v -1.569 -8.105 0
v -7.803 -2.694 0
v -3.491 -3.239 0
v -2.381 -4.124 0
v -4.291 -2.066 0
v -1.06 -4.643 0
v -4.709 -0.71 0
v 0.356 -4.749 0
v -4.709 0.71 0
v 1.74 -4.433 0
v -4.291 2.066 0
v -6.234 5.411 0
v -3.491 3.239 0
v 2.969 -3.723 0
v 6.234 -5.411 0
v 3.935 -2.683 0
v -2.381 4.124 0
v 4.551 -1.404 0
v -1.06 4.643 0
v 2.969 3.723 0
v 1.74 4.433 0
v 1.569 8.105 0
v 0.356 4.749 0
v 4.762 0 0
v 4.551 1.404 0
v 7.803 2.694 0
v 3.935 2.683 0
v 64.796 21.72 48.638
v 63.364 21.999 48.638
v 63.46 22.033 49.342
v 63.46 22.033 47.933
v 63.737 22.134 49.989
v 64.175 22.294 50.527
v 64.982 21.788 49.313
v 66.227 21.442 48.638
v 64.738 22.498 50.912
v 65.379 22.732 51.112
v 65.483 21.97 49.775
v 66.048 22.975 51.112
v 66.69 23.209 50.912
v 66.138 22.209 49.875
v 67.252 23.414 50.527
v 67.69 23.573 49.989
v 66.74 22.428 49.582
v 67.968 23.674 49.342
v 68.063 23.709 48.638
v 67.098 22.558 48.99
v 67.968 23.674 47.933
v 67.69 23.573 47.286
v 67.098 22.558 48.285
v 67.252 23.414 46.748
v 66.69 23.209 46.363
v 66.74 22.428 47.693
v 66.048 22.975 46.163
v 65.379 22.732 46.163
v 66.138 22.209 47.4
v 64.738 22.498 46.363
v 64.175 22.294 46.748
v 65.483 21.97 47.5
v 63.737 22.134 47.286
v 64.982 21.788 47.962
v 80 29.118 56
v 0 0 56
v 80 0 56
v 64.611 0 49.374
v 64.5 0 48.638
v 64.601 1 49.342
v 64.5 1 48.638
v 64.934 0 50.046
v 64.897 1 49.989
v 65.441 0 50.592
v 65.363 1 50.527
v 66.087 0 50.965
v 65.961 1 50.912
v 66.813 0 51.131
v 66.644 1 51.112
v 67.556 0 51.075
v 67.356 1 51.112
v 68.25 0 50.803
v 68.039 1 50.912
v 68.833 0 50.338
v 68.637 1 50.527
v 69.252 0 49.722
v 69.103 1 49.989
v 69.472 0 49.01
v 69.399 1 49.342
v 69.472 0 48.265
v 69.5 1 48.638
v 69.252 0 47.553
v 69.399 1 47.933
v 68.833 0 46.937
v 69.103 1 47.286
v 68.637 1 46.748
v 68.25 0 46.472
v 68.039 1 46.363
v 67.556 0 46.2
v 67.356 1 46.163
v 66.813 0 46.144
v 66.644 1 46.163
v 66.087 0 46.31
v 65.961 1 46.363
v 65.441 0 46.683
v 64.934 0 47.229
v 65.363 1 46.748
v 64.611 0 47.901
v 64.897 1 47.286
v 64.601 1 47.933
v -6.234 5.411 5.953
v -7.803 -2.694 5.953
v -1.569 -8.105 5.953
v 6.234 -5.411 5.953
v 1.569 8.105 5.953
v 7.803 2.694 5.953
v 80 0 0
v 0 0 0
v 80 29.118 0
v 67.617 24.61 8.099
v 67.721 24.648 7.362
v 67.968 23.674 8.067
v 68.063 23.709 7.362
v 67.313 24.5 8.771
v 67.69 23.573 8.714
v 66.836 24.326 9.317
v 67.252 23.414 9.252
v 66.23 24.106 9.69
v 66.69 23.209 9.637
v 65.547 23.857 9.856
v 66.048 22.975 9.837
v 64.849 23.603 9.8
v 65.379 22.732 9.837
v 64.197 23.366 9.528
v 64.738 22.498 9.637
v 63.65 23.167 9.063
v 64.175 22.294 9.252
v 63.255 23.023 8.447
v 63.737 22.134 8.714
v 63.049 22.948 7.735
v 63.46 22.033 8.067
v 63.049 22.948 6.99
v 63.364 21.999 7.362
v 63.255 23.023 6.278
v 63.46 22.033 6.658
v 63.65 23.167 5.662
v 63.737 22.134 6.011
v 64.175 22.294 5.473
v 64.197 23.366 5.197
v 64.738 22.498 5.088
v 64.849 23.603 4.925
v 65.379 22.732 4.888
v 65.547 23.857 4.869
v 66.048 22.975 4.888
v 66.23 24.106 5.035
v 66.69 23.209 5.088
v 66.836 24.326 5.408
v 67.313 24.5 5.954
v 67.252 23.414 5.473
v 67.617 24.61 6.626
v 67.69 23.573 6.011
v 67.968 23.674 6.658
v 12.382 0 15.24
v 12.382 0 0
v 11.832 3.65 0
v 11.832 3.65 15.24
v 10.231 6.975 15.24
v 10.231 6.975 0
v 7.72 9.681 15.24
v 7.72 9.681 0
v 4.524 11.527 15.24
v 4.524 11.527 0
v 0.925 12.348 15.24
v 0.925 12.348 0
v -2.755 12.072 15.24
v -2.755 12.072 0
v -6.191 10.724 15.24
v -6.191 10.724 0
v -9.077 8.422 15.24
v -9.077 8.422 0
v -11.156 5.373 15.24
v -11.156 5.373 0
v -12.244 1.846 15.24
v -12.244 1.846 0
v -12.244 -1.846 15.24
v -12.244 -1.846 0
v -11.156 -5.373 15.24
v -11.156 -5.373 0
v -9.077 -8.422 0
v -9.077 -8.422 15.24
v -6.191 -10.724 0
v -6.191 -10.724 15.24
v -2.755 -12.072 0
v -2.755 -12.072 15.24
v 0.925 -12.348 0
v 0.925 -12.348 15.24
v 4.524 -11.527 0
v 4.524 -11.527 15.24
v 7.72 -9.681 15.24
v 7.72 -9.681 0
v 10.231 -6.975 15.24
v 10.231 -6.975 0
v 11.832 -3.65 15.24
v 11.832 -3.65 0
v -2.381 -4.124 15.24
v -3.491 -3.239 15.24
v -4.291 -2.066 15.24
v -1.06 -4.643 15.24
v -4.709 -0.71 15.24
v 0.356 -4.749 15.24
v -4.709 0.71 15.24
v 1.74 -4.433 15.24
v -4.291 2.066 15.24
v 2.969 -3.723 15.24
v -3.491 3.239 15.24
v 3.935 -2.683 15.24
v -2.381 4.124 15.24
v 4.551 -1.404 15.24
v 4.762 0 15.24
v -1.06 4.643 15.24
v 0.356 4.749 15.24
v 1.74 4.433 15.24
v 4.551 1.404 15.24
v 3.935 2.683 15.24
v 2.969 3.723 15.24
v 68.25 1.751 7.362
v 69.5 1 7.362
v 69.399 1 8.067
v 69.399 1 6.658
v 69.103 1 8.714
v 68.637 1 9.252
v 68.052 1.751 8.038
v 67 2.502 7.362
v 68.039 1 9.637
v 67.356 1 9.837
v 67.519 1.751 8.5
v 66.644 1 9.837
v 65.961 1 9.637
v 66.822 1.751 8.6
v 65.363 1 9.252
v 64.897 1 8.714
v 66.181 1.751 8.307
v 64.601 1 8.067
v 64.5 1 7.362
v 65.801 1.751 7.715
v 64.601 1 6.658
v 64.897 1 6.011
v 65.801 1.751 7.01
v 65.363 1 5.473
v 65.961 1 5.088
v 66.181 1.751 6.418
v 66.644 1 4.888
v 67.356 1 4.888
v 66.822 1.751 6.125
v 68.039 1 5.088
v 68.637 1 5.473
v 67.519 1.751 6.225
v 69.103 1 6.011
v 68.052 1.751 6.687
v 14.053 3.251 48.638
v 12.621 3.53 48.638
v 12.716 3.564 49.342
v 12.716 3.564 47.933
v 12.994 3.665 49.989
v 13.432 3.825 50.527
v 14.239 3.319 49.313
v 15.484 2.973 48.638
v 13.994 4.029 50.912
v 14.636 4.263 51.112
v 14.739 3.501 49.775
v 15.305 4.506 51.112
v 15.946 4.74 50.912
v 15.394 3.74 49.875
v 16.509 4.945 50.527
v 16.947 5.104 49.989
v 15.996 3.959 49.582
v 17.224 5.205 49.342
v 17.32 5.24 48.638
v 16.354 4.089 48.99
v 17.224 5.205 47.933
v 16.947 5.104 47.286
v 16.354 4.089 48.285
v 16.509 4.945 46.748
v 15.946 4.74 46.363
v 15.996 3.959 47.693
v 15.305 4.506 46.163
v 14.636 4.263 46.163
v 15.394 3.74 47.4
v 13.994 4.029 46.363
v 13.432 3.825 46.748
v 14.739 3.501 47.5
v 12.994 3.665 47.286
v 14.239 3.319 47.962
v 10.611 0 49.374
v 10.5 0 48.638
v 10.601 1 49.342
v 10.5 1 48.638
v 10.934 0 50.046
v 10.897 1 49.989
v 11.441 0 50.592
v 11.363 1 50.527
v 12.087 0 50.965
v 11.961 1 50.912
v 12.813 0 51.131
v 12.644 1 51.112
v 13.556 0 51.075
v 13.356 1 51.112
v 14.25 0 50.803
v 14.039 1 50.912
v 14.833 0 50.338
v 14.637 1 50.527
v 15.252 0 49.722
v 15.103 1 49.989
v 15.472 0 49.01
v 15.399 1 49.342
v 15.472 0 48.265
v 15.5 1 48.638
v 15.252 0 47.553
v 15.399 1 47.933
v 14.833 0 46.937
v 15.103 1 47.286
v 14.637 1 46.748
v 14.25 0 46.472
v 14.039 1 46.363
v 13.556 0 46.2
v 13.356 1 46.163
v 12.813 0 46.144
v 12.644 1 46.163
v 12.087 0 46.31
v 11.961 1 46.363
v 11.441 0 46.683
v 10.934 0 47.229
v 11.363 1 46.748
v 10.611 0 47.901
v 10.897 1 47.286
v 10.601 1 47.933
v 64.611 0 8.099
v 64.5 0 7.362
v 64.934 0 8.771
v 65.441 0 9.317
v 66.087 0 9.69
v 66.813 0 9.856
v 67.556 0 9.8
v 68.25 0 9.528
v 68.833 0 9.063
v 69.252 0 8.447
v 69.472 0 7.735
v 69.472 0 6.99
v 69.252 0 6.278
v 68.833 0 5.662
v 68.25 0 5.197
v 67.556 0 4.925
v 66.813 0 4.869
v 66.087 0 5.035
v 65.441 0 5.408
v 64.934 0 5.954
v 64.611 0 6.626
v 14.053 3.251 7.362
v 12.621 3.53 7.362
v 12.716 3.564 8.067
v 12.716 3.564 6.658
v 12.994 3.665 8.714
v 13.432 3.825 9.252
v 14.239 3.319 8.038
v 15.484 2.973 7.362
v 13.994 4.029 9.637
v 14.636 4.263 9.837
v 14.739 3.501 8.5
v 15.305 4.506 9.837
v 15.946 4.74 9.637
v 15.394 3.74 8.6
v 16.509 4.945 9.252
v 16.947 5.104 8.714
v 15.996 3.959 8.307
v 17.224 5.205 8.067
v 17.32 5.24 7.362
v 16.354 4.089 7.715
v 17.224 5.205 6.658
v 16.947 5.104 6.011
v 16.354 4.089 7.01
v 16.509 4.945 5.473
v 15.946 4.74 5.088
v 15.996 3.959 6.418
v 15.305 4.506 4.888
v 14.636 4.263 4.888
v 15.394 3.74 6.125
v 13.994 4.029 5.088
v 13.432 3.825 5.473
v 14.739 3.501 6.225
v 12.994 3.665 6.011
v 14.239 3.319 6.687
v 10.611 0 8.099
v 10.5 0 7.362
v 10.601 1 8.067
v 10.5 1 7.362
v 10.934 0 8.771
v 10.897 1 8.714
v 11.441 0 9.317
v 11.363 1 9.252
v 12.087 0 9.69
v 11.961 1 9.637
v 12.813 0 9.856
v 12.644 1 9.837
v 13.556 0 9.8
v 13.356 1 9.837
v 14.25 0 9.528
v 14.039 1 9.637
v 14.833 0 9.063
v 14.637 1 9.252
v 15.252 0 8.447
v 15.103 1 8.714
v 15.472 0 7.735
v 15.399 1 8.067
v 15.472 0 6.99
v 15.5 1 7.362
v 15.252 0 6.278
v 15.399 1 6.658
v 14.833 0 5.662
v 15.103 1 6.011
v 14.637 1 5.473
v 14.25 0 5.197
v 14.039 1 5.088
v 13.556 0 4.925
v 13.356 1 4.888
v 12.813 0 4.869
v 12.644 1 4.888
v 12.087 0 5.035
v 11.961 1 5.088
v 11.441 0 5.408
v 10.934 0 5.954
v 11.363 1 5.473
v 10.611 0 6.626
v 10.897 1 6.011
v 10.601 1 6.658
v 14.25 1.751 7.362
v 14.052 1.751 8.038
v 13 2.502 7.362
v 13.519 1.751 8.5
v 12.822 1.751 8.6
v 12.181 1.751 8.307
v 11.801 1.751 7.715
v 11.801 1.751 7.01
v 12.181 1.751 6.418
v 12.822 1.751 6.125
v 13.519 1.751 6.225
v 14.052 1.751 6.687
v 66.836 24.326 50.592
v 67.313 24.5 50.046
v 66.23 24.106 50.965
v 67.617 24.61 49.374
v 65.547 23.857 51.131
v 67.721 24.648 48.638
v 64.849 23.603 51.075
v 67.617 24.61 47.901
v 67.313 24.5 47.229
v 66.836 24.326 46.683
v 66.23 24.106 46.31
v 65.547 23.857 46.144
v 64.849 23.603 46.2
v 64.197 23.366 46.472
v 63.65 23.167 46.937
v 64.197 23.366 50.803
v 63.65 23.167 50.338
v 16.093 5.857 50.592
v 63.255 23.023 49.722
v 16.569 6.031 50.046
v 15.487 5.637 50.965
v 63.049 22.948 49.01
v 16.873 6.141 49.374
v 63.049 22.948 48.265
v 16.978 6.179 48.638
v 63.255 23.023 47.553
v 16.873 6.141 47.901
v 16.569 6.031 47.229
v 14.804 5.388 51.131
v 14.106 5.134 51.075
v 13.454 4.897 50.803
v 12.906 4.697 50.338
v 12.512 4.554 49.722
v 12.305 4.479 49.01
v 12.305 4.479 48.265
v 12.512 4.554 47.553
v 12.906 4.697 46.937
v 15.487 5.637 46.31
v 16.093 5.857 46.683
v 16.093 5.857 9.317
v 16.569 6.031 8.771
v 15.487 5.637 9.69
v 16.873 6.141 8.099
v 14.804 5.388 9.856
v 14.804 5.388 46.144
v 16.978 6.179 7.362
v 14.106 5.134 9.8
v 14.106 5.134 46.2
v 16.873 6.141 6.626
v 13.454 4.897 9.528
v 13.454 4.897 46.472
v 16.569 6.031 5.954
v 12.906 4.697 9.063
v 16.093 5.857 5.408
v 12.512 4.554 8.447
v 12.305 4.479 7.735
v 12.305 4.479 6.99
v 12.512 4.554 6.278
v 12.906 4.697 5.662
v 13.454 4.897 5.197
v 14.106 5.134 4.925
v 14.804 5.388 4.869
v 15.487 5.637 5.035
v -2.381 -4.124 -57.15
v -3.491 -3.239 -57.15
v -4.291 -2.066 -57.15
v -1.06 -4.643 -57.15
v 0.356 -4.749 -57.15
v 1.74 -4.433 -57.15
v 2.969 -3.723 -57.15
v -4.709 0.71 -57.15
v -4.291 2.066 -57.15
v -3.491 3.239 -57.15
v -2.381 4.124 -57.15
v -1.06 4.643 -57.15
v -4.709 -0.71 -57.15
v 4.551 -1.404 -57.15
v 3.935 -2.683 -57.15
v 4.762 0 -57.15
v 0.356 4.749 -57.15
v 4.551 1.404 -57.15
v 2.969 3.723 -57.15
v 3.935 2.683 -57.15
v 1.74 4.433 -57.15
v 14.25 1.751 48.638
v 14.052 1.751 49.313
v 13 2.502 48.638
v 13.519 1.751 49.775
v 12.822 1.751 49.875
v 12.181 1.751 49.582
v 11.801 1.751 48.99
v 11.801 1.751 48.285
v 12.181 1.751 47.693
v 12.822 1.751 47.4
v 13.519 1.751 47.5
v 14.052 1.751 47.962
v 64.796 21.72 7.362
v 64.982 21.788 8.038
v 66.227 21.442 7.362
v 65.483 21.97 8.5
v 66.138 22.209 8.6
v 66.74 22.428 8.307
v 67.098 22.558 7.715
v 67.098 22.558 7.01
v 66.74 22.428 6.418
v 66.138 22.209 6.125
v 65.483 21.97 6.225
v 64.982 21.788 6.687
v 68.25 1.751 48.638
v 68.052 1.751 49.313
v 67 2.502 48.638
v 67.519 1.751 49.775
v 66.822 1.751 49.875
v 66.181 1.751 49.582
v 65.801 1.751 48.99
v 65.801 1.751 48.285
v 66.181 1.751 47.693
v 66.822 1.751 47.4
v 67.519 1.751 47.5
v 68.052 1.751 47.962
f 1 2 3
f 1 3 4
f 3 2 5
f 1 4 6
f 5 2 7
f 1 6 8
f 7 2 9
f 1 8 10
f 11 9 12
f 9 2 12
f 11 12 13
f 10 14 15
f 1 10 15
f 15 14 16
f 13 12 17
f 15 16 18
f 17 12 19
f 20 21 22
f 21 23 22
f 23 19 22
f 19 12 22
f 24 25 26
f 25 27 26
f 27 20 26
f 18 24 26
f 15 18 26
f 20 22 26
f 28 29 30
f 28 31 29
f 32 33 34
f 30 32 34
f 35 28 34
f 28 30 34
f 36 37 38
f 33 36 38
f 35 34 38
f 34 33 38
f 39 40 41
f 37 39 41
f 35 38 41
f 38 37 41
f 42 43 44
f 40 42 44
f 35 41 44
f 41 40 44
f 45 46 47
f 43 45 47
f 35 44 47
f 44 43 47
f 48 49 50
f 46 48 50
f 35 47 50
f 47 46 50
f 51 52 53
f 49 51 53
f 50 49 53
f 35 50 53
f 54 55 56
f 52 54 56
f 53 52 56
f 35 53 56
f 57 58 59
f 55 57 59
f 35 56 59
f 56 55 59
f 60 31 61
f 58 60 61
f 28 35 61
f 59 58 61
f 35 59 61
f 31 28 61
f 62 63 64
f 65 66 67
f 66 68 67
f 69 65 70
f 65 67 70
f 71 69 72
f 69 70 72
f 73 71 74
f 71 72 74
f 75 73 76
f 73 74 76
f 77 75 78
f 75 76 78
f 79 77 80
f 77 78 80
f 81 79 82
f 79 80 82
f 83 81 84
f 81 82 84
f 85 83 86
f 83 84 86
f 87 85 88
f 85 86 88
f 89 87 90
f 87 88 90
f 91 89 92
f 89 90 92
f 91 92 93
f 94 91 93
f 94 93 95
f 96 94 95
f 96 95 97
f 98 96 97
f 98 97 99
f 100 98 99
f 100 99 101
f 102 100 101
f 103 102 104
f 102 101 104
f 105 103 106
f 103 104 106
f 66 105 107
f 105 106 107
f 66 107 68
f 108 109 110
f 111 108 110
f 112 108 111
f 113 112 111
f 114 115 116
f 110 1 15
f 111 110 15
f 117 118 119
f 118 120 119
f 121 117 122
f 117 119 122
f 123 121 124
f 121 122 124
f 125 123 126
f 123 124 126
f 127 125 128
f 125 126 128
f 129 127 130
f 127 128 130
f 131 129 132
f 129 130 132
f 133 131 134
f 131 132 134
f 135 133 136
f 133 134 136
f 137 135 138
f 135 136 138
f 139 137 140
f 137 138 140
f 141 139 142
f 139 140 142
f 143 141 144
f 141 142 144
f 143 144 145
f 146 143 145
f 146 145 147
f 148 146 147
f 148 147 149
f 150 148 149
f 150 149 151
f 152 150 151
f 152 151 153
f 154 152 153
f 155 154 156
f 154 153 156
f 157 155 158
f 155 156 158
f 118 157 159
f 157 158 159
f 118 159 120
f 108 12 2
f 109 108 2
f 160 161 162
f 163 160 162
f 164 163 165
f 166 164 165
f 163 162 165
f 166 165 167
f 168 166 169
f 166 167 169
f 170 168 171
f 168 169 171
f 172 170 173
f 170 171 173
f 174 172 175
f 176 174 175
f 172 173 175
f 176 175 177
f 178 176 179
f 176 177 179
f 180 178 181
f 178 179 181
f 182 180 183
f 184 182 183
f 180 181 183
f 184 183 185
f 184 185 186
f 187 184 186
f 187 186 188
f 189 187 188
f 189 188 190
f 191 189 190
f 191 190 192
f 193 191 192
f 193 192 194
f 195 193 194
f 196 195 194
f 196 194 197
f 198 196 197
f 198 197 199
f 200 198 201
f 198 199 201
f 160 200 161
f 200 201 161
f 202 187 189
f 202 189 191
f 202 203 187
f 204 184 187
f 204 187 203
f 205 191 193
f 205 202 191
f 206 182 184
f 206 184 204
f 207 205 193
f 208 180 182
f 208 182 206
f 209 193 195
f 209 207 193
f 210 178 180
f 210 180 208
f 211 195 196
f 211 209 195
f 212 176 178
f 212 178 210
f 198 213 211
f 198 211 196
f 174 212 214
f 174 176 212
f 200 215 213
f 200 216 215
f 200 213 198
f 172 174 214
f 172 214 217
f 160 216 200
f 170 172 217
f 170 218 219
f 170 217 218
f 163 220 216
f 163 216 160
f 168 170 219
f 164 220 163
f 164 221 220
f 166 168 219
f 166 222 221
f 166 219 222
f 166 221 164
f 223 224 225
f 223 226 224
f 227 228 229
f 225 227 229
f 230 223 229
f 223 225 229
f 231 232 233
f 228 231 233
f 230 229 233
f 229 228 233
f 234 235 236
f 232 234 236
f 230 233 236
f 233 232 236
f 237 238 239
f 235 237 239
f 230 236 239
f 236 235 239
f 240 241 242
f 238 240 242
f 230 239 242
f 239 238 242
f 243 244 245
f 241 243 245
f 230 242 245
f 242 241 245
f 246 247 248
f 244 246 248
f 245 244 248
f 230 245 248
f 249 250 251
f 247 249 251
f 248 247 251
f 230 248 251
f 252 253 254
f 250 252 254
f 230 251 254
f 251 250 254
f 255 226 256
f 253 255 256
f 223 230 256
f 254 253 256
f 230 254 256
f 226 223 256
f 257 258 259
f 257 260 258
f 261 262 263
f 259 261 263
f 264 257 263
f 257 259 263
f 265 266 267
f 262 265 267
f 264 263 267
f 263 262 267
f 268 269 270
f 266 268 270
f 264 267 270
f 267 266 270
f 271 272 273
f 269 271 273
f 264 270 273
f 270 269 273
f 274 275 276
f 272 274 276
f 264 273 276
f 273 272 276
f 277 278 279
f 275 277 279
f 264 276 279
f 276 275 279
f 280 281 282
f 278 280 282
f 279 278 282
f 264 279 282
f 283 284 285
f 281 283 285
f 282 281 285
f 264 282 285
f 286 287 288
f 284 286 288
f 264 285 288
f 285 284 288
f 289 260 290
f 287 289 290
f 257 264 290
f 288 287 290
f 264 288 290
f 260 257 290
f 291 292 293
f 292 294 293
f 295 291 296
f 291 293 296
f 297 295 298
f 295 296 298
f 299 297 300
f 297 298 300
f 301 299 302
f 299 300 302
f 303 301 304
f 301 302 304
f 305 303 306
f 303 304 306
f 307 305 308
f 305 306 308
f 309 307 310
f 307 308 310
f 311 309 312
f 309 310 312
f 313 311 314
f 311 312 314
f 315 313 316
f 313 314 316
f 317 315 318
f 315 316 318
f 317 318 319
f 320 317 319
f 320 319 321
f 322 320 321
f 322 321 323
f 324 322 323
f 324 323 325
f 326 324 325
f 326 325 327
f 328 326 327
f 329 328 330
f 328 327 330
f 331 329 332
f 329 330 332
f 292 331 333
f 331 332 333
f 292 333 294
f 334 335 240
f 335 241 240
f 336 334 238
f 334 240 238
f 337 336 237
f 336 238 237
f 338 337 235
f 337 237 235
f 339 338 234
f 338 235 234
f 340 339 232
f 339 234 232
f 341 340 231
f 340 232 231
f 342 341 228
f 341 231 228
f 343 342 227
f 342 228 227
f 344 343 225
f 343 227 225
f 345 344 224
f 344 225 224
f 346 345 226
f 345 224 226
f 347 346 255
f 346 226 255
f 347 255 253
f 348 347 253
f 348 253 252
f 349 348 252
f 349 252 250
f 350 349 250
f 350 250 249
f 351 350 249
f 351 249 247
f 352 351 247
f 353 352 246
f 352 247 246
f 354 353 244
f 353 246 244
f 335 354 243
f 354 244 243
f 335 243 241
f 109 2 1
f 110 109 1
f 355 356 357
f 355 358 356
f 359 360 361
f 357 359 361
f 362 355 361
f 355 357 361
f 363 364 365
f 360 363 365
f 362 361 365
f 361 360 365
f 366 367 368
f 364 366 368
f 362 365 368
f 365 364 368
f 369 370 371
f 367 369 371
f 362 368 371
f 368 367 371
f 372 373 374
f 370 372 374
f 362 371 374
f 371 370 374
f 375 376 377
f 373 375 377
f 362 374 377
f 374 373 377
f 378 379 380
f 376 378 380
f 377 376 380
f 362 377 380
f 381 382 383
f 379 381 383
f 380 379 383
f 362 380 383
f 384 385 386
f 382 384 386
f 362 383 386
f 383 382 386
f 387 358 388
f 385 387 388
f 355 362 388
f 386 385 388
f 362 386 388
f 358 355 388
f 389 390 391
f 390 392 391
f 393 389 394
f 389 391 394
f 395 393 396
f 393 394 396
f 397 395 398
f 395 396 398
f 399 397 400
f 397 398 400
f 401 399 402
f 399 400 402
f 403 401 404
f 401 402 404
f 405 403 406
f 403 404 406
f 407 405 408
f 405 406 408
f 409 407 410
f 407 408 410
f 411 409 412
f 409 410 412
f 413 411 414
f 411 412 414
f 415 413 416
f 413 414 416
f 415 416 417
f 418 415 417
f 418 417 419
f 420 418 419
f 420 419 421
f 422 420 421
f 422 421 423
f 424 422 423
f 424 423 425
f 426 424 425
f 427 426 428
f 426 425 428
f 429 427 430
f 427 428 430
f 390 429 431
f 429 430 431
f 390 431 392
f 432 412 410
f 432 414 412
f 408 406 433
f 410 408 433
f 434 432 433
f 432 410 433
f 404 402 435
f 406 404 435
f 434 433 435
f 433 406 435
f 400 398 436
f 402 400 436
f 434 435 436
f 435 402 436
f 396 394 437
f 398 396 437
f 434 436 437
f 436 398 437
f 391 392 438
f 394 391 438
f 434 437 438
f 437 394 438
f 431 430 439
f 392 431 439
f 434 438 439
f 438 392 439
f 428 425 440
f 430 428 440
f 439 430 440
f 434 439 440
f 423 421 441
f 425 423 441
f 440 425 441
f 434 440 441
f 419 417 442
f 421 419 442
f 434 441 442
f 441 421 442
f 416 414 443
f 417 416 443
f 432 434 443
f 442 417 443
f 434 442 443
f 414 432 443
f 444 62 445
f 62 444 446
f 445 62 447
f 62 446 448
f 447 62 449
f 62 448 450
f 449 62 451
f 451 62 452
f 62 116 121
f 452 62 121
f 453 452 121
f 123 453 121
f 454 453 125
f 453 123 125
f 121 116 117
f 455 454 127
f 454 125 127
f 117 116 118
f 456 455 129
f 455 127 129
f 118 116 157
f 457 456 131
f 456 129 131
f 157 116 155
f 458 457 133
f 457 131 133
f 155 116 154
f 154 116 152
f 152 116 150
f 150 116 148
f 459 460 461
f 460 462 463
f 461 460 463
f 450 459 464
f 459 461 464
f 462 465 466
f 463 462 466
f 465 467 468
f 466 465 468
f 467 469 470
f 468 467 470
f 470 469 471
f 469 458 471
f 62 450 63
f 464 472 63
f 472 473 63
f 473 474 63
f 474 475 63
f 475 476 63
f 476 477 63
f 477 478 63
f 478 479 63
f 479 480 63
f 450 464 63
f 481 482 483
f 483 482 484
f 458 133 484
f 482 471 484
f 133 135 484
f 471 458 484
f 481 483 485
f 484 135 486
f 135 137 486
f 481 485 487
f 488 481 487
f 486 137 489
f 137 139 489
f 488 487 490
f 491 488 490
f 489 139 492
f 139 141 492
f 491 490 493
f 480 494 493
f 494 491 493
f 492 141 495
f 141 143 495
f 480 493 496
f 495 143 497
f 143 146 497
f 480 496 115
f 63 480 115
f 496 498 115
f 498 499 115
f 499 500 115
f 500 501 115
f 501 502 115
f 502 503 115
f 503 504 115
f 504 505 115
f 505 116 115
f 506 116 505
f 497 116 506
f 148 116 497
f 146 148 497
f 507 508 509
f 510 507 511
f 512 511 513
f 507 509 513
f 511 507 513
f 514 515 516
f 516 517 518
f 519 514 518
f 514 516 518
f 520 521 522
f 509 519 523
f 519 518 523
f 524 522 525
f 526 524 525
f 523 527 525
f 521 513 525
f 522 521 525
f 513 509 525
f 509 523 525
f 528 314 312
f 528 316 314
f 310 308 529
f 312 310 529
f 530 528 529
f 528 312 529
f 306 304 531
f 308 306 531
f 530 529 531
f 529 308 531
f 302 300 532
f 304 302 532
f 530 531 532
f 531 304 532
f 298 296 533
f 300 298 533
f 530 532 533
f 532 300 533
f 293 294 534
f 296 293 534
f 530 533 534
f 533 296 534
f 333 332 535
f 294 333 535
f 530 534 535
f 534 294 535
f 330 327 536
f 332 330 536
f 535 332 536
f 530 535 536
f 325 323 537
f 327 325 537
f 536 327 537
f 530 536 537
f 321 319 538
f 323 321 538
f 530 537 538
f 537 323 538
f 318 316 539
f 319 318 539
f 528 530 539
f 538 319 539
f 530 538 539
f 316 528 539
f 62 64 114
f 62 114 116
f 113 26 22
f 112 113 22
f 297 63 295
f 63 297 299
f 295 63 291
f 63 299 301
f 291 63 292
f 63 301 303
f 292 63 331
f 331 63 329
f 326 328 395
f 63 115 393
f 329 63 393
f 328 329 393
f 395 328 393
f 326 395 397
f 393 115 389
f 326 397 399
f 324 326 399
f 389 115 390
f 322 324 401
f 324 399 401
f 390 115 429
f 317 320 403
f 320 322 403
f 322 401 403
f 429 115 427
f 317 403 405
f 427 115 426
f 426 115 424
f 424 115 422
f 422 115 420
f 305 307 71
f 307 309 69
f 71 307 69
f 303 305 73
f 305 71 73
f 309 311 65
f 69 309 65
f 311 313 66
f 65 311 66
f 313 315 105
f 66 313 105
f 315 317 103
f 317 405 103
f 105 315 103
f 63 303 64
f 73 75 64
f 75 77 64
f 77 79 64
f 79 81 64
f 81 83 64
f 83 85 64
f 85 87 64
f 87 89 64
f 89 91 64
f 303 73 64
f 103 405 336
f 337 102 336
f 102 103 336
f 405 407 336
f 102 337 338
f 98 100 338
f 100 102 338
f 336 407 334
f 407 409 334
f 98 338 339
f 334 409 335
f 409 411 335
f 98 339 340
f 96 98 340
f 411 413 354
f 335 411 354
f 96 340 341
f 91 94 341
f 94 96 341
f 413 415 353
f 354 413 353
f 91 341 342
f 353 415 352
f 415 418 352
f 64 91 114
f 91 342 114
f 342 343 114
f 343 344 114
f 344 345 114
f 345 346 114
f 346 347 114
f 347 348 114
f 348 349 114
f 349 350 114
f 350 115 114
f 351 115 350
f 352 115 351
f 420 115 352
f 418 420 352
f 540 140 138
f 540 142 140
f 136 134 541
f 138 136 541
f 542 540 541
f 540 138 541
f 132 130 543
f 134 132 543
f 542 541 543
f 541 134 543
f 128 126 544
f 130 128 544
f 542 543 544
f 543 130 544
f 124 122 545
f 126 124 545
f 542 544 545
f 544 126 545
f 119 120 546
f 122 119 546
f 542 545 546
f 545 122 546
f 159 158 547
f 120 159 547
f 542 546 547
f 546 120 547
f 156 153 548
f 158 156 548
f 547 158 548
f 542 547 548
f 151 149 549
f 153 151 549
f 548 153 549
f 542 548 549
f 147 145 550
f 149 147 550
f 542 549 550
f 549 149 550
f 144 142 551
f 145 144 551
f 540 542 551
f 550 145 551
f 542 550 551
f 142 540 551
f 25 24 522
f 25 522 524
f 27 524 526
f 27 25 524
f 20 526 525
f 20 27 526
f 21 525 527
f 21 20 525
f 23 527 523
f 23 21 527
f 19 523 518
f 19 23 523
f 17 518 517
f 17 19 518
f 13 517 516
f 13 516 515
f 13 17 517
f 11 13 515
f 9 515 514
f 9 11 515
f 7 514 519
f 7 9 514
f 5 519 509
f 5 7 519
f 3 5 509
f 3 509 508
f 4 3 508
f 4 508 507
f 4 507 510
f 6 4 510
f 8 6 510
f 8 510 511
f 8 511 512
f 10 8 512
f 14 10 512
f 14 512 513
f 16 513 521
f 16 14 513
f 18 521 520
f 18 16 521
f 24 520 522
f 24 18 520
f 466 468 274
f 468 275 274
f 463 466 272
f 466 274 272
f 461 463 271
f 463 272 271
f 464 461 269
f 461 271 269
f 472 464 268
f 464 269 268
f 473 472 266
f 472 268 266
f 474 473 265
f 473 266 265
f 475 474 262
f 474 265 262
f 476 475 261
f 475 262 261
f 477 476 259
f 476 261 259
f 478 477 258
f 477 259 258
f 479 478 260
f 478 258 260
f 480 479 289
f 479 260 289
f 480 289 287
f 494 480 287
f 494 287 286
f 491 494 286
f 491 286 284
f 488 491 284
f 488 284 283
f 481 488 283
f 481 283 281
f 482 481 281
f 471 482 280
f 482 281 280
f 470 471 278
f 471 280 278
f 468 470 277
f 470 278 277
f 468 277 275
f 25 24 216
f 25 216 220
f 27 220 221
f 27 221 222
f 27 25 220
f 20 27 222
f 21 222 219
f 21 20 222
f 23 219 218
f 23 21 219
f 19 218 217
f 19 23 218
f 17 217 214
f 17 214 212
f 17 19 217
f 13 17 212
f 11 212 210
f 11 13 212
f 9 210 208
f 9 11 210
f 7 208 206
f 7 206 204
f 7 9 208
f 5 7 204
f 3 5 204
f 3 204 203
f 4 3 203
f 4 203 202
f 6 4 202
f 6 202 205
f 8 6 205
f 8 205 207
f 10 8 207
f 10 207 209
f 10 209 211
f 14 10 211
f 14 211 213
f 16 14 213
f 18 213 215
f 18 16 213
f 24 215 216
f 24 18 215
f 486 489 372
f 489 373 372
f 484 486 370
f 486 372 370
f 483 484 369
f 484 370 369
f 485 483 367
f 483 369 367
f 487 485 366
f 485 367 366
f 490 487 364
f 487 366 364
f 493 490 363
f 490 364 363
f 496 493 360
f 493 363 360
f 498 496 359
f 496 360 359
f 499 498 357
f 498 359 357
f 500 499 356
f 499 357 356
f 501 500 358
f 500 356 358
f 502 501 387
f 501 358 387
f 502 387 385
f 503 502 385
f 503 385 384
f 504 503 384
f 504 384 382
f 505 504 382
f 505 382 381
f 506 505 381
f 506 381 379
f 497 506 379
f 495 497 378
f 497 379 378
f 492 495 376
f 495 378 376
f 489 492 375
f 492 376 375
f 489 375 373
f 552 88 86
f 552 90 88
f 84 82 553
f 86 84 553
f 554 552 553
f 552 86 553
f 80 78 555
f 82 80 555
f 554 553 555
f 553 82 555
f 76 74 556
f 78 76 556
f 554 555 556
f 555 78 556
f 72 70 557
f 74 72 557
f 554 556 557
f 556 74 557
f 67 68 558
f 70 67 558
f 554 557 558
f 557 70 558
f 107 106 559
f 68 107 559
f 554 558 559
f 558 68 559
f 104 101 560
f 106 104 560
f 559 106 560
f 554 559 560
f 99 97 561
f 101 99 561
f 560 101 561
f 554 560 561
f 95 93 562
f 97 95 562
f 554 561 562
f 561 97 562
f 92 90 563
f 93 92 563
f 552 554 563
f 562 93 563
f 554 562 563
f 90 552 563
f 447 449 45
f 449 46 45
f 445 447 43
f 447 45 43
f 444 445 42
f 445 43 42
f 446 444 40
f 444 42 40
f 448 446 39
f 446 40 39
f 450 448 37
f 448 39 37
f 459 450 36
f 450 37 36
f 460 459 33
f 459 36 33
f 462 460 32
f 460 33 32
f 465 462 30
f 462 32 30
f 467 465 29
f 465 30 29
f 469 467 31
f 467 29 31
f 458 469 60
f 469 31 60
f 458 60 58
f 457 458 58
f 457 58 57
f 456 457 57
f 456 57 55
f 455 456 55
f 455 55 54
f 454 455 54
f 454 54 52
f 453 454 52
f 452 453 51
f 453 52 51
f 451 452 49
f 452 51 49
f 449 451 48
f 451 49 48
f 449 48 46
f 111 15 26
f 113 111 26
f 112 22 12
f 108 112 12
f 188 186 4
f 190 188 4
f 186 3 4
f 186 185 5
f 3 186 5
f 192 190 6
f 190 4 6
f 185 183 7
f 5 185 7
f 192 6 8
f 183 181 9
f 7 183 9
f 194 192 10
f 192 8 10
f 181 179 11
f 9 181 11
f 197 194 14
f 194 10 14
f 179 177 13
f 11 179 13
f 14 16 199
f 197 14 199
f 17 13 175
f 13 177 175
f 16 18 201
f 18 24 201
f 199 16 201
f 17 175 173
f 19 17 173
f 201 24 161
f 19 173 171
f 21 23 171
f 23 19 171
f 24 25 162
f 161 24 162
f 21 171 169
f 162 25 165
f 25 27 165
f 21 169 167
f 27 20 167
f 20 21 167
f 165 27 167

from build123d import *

# Parameters (mm, degrees)
F0_R           = 12.3825
F0_R_2         = 4.7625
F1_DEPTH       = 15.24
F2_R           = 4.7625
F3_DEPTH       = 5.953125
F4_DEPTH       = 57.15
F6_DEPTH       = 56
F9_D           = 5
F9_DEPTH       = 1
F9_TIP         = 1.5021515476
F9_ON_F8_D     = 5
F9_ON_F8_DEPTH = 1
F9_ON_F8_TIP   = 1.5021515476


# Not quite as in the source:
# - a length typed as a fraction of an inch, garbled in the dataset ("3 / 203.2 mm" for 3/8 in), is restored


with BuildPart() as f1:
    # F0 (on Top) → F1 (new body)
    with BuildSketch(Plane.XY):
        Circle(F0_R)
        Circle(F0_R_2, mode=Mode.SUBTRACT)
    extrude(amount=F1_DEPTH)


with BuildPart() as f3:
    # F2 (on Top) → F3 (new body)
    with BuildSketch(Plane.XY):
        Polygon((-1.5688368276, -8.1045527951), (6.234330193, -5.4109289447), (7.8031670207, 2.6936238504), (1.5688368276, 8.1045527951), (-6.234330193, 5.4109289447), (-7.8031670207, -2.6936238504), align=None)
        Circle(F2_R, mode=Mode.SUBTRACT)
        Circle(F2_R)
    extrude(amount=F3_DEPTH)

    # F2 (on Top) → F4 (join)
    with BuildSketch(Plane.XY):
        Circle(F2_R)
    extrude(amount=-F4_DEPTH)


with BuildPart() as f6:
    # F5 (on Top) → F6 (new body)
    with BuildSketch(Plane.XY):
        Polygon((80, 29.1176187413), (0, 0), (80, 0), align=None)
    extrude(amount=F6_DEPTH)

    # F9
    with Locations(Plane(origin=(0, 0, 0), x_dir=(-0.9396926208, -0.3420201433, 0), z_dir=(-0.3420201433, 0.9396926208, 0))):
        with Locations((-15.567110899, 48.6375), (-15.567110899, 7.3625), (-69.567110899, 7.3625), (-69.567110899, 48.6375)):
            Hole(F9_D / 2, depth=F9_DEPTH)
            with Locations((0, 0, -(F9_DEPTH + F9_TIP / 2))):  # 118° drill point
                Cone(0, F9_D / 2, F9_TIP, mode=Mode.SUBTRACT)

    # F9 on F8
    with Locations(Plane.XZ):
        with Locations((13, 48.6375), (13, 7.3625), (67, 48.6375), (67, 7.3625)):
            Hole(F9_ON_F8_D / 2, depth=F9_ON_F8_DEPTH)
            with Locations((0, 0, -(F9_ON_F8_DEPTH + F9_ON_F8_TIP / 2))):  # 118° drill point
                Cone(0, F9_ON_F8_D / 2, F9_ON_F8_TIP, mode=Mode.SUBTRACT)


solid = Compound([f1.part, f3.part, f6.part])
